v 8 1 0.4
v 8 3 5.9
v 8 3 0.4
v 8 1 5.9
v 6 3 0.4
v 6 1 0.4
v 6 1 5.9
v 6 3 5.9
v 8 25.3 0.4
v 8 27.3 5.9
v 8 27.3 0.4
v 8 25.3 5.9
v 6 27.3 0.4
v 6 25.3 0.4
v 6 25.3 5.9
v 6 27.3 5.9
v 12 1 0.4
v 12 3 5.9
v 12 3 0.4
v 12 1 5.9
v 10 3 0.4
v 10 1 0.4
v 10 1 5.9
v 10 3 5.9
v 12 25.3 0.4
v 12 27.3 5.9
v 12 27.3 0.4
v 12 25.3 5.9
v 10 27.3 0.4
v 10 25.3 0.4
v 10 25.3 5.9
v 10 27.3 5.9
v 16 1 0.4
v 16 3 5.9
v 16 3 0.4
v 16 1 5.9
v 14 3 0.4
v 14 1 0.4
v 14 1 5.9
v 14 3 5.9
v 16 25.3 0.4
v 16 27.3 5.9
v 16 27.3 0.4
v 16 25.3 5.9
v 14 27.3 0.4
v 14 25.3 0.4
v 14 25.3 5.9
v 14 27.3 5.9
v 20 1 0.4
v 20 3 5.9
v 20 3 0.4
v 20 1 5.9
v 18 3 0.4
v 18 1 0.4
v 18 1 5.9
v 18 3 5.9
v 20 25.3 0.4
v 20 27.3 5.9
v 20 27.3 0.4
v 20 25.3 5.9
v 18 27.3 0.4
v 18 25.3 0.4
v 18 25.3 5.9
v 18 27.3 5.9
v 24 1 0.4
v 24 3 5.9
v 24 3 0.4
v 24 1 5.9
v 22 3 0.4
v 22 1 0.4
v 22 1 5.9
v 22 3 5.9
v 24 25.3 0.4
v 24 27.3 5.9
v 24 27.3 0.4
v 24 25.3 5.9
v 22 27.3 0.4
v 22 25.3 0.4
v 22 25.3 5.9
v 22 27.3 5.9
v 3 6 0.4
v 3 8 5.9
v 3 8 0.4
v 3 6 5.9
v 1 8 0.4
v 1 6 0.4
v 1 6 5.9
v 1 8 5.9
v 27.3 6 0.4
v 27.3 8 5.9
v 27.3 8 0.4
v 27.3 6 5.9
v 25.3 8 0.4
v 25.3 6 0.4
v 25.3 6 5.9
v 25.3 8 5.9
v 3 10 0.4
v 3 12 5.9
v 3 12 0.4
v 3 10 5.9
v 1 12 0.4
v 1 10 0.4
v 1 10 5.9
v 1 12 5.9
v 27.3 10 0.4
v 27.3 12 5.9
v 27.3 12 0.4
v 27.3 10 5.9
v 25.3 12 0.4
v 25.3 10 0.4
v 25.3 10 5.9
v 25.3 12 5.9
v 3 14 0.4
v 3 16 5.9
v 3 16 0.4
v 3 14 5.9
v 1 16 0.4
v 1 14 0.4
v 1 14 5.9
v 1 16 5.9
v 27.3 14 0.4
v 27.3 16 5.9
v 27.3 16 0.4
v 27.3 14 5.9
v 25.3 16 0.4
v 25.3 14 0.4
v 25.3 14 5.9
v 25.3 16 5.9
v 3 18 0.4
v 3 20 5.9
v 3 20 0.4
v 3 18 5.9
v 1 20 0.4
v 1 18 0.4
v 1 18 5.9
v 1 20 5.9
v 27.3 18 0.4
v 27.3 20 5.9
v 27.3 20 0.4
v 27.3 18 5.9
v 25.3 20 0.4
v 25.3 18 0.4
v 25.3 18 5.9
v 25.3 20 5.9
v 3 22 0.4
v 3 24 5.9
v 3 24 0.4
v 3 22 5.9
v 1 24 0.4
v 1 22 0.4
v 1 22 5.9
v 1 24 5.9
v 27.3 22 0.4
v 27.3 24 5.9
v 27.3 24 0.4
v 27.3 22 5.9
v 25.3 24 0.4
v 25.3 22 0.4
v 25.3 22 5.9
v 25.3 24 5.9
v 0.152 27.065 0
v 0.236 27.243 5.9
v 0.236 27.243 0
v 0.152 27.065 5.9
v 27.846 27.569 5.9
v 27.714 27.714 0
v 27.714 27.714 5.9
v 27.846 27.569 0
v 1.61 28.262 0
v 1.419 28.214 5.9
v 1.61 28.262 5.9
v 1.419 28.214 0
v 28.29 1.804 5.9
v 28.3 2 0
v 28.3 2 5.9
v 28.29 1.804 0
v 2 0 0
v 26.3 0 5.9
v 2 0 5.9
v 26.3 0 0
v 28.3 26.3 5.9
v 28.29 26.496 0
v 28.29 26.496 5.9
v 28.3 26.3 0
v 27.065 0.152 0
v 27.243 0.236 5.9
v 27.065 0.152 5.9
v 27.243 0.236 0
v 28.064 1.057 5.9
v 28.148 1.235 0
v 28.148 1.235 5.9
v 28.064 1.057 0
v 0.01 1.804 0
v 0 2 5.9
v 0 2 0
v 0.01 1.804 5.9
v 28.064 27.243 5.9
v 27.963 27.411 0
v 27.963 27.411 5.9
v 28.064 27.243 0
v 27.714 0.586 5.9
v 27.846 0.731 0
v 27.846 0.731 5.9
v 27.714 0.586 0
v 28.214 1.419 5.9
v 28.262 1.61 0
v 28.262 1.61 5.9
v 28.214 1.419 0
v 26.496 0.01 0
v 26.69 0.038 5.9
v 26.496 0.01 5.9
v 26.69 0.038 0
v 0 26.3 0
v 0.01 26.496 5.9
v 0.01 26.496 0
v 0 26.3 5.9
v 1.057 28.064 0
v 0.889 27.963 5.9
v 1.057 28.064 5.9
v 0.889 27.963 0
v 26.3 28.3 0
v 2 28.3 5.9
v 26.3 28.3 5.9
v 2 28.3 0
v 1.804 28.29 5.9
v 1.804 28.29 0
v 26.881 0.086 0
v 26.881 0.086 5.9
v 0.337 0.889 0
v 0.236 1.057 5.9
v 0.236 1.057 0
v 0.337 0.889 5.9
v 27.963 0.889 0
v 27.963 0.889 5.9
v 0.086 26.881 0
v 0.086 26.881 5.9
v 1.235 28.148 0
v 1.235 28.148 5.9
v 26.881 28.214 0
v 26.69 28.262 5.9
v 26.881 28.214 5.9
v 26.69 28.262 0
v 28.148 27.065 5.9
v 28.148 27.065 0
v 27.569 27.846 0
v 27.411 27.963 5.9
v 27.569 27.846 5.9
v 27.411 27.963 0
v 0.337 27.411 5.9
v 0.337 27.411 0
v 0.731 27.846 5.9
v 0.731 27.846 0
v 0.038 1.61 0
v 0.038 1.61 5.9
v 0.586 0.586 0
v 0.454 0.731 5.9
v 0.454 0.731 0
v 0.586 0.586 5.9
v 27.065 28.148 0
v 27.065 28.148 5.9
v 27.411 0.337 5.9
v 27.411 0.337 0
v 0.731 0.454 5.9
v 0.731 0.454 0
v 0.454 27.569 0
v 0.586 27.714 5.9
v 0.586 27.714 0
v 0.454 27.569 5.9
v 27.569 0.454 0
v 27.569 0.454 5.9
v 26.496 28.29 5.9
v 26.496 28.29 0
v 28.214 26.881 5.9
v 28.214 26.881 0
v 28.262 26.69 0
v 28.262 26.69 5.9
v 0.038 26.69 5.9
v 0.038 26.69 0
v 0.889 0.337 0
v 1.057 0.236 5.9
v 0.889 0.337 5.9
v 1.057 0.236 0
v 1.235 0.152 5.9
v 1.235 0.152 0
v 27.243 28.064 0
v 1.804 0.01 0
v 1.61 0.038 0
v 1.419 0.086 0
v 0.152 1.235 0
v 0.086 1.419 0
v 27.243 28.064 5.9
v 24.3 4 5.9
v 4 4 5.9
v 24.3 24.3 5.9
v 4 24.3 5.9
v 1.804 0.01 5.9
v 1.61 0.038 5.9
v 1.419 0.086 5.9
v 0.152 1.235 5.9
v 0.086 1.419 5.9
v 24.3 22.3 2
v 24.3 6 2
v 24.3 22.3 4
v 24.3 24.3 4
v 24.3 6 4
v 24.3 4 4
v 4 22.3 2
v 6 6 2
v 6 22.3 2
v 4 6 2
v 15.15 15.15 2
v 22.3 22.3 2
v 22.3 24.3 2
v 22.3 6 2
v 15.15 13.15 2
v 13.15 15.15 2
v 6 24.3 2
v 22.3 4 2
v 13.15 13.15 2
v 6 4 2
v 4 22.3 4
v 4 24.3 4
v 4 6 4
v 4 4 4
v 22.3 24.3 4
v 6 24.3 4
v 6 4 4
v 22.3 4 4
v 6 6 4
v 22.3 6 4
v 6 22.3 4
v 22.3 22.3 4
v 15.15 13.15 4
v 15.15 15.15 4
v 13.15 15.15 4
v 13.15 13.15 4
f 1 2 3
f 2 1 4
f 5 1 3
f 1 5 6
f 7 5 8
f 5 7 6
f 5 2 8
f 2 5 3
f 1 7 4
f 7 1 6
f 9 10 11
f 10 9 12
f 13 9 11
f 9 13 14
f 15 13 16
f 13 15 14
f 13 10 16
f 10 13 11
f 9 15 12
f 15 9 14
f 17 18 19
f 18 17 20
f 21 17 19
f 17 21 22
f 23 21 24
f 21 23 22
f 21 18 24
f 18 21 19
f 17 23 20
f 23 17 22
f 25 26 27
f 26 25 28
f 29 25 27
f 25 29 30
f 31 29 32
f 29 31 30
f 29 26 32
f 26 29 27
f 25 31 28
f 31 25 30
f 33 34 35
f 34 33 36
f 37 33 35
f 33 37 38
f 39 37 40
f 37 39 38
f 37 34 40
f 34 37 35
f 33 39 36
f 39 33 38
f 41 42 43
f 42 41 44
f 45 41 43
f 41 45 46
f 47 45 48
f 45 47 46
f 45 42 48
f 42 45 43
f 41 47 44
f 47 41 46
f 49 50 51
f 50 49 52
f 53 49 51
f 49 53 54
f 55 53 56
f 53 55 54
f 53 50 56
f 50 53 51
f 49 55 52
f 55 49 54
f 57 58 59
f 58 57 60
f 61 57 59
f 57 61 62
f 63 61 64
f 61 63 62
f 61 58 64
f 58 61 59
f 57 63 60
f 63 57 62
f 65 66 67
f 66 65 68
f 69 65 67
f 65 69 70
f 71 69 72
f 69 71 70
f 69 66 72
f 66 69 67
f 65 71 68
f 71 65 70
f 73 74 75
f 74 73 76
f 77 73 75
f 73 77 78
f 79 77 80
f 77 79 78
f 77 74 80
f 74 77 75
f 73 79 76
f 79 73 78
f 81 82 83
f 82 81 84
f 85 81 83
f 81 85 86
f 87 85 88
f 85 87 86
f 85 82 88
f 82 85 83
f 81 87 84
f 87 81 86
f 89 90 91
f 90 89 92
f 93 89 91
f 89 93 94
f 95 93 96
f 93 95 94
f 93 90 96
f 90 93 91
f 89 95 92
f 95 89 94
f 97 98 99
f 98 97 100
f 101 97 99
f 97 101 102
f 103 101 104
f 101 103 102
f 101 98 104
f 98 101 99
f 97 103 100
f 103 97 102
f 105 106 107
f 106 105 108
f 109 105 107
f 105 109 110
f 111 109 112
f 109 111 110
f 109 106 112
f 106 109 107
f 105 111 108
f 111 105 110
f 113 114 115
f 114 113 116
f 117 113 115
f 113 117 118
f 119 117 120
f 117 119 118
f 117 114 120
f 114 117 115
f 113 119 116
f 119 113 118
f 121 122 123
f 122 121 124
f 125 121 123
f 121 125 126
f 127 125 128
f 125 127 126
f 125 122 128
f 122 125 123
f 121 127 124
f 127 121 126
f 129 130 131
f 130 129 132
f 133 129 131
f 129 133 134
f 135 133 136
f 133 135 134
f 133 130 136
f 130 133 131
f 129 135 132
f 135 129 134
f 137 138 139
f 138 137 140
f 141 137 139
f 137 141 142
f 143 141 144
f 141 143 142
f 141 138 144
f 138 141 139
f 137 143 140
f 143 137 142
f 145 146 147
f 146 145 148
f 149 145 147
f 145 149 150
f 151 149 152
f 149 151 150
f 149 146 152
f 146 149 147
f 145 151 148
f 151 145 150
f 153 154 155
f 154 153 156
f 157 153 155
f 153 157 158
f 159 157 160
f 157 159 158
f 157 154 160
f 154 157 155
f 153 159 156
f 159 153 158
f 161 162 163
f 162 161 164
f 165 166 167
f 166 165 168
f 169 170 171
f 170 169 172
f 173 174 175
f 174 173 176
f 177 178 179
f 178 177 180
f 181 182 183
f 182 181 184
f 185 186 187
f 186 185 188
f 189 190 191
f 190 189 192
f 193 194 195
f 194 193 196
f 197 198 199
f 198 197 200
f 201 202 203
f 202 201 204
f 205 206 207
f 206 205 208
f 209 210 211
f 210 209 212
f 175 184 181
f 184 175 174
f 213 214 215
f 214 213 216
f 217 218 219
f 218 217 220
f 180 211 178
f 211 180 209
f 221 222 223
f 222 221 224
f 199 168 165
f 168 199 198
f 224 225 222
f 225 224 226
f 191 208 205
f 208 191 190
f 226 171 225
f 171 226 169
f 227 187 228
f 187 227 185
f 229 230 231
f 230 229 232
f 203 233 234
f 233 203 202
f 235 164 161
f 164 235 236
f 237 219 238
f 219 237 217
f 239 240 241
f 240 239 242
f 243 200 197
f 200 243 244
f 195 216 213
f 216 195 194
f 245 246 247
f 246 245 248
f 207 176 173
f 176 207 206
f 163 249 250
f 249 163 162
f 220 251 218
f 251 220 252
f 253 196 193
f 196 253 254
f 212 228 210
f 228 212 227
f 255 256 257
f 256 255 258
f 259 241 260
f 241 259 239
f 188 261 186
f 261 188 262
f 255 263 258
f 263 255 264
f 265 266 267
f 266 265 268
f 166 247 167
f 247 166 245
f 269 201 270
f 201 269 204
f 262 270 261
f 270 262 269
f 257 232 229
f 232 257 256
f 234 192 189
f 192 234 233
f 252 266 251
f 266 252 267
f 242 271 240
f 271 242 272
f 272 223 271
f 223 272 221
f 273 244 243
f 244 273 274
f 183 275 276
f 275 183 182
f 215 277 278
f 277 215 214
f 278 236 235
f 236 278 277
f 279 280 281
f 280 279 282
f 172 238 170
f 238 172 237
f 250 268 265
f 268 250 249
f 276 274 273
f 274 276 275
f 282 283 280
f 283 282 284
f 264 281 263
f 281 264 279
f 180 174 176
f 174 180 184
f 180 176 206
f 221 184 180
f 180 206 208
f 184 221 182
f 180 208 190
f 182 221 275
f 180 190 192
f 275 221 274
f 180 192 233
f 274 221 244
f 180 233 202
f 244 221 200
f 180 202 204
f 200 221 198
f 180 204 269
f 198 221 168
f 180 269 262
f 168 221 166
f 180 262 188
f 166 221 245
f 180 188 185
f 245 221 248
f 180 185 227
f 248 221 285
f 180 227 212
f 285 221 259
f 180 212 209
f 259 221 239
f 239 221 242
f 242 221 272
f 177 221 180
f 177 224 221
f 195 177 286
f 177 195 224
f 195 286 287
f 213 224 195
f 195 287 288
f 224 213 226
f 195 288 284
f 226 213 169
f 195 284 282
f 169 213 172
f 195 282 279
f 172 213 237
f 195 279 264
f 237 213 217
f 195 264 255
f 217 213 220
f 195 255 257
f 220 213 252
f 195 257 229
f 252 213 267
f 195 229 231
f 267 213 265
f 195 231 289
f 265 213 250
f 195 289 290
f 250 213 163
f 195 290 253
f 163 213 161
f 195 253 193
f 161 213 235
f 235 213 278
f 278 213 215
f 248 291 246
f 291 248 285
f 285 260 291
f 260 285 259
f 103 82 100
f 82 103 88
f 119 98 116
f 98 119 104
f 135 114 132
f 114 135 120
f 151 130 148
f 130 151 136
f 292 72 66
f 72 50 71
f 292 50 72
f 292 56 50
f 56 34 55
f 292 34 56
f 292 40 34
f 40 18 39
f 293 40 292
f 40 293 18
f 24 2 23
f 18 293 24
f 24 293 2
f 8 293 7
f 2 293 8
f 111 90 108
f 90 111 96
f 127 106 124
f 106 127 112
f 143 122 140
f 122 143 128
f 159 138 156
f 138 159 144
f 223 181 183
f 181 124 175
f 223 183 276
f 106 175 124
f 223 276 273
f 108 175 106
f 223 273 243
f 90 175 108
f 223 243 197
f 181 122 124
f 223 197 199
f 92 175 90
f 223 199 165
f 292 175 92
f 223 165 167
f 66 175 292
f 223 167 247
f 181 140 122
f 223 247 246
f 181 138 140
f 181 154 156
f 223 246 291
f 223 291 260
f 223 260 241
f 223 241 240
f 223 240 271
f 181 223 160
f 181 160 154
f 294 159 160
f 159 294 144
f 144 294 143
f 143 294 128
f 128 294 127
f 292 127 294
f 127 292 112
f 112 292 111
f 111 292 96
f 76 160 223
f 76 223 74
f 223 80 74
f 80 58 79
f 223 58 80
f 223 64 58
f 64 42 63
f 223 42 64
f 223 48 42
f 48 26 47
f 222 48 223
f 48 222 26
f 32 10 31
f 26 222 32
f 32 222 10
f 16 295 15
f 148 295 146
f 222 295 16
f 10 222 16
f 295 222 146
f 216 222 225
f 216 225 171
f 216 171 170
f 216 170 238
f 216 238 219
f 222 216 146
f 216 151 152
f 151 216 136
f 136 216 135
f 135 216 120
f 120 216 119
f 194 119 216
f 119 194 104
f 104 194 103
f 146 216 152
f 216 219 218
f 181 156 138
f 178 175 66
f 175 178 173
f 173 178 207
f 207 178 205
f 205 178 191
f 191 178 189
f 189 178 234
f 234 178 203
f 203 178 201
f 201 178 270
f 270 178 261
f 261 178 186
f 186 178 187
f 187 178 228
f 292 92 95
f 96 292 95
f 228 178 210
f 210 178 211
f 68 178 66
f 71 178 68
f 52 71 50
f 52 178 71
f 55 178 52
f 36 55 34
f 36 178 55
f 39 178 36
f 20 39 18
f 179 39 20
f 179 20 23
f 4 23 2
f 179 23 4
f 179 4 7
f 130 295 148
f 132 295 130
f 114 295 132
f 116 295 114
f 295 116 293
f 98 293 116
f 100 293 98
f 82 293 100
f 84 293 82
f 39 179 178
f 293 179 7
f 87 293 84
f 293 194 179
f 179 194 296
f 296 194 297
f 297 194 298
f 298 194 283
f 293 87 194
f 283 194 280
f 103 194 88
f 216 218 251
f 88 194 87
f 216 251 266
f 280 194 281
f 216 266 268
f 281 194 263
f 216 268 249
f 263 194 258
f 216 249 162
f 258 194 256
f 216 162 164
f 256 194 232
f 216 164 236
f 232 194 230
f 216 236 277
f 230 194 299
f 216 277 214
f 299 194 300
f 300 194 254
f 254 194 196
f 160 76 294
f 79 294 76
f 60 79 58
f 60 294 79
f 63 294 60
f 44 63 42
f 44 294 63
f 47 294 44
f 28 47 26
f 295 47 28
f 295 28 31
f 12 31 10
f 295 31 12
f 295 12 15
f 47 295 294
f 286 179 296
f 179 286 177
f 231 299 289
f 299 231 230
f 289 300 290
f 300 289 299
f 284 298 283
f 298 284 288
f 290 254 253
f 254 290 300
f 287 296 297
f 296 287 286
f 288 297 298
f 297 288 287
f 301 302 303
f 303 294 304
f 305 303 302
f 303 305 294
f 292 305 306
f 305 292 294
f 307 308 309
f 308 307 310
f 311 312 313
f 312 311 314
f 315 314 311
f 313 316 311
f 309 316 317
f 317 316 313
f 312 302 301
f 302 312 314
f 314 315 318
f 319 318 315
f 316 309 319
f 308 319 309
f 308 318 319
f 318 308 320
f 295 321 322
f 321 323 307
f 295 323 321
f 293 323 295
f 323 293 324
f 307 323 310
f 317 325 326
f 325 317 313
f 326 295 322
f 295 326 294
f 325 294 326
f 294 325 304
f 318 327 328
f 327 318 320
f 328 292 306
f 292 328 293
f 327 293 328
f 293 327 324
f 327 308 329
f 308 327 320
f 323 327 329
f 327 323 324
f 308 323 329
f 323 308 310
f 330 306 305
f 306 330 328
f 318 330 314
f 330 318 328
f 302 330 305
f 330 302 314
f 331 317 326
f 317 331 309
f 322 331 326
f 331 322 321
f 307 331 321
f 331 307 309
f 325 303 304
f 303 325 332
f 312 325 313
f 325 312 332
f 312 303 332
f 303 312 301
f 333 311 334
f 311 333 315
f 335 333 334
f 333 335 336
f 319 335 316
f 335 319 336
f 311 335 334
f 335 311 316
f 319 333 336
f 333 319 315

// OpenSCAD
/*
Electronic board bottom protection
(C) Pierre Delore
12/2018
*/

// Board length in mm
length=20;
// Board width in mm
width=20;
// XY clearance in mm (clearance between the board and the part)
xy_clearance=0.3;
// Clearance under the board in mm (higher than the pins height)
board_clearance=2;
// Clearance over the board in mm (space between the top of the board and the top of the part
top_clearance=0.5;
// Board tickness in mm
board_tick = 1.4; //Board tickness in mm
// Support in the center
pad_in_center = "yes"; //[yes,no]

/* [Hidden */
//-- internal --------------------------------------------------


$fn=64;
ep=0.01;
ep2=0.02;
tick=4; //Tickness in mm
tick_h=2;
heigth=tick_h+board_clearance+board_tick+top_clearance; //box heigth in mm
length_c=length+xy_clearance;
width_c=width+xy_clearance;
l=length_c+tick*2;
w=width_c+tick*2;



//---------------------------------------------------------------
module roundbox(wx, wy, wz, radius) {
	hull() {
		translate([radius, radius, 0])
			cylinder(r=radius, h=wz);

		translate([wx-radius, radius, 0])
			cylinder(r=radius, h=wz);

		translate([radius, wy-radius,0])
			cylinder(r=radius,h=wz);

		translate([wx-radius,wy-radius,0])
			cylinder(r=radius,h=wz);
	}
}

//---------------------------------------------------------------
module board() {
  union() {
    difference() {
      union() {
        //-- External box
        roundbox(l,w,heigth,2);
      }
      //Internal box
      translate([tick, tick, tick_h])
        cube([length_c, width_c, heigth]);
      
      //-- Length slots 
      nl=floor(length_c/4);
      for(x=[0:nl-1]) {
        translate([2+tick+x*4, (tick-2)/2, 0.4])
          cube([2,2,heigth+ep2]);
        translate([2+tick+x*4, w-tick+(tick-2)/2, 0.4])
          cube([2,2,heigth+ep2]);
      }

      //-- Width slots
      nw=floor(width_c/4);
      for(y=[0:nw-1]) {
        translate([(tick-2)/2, 2+tick+y*4, 0.4])
          cube([2,2,heigth+ep2]);
        
        translate([l-tick+(tick-2)/2, 2+tick+y*4, 0.4])
          cube([2,2,heigth+ep2]);
      }
    }
    //Pads
    translate([tick, tick, tick_h])
      cube([2,2,board_clearance]);
    
    translate([l-tick-2, tick, tick_h])
      cube([2,2,board_clearance]);

    translate([tick, w-tick-2, tick_h])
      cube([2,2,board_clearance]);
    
    translate([l-tick-2, w-tick-2, tick_h])
      cube([2,2,board_clearance]);
    
    if (pad_in_center=="yes")
      translate([(l-2)/2, (w-2)/2, tick_h])
        cube([2,2,board_clearance]);      
  }
}


//---------------------------------------------------------------
module locker() {
  cube([1.8, 1.8*3, 1.8]);
  
  translate([0, 1.8*3, 0])
    cube([1.8*3,1.8,1.8]);
}


module 4lockers() {
  translate([3, 3*1.8, 0])
    cube([5,1.8,0.2]);
  translate([3, -4*1.8-0.5, 0])
    cube([5,1.8,0.2]);
  translate([0, -3, 0])
    cube([1.8, 5, 0.2]);
  translate([1.8*5+0.5, -3, 0])
    cube([1.8, 5, 0.2]);
  
  locker();
  rotate([0,180,0])
    translate([-(1.8*6)-0.5,0,-1.8])
      locker();
  rotate([180,0,0])
    translate([0,0.5,-1.8])
      locker();
  rotate([180,180,0])
      translate([-(1.8*6)-0.5,0.5,0])
        locker();
}

module ULocker() {
  cube([1.8, 1.8*2, 1.8]);

  translate([4+0.2,0,0])
    cube([1.8, 1.8*2, 1.8]);
  
  translate([0, 1.8*2, 0])
    cube([6,1.8,1.8]);  
}

module 2ULockers() {
  ULocker();
  
  translate([0,-0.5,1.8])
    rotate([180,0,0])
      ULocker();
  
  translate([0, -3, 0])
    cube([1.8, 5, 0.2]);
  translate([4.2, -3, 0])
    cube([1.8, 5, 0.2]);

}

// Go!
board();
